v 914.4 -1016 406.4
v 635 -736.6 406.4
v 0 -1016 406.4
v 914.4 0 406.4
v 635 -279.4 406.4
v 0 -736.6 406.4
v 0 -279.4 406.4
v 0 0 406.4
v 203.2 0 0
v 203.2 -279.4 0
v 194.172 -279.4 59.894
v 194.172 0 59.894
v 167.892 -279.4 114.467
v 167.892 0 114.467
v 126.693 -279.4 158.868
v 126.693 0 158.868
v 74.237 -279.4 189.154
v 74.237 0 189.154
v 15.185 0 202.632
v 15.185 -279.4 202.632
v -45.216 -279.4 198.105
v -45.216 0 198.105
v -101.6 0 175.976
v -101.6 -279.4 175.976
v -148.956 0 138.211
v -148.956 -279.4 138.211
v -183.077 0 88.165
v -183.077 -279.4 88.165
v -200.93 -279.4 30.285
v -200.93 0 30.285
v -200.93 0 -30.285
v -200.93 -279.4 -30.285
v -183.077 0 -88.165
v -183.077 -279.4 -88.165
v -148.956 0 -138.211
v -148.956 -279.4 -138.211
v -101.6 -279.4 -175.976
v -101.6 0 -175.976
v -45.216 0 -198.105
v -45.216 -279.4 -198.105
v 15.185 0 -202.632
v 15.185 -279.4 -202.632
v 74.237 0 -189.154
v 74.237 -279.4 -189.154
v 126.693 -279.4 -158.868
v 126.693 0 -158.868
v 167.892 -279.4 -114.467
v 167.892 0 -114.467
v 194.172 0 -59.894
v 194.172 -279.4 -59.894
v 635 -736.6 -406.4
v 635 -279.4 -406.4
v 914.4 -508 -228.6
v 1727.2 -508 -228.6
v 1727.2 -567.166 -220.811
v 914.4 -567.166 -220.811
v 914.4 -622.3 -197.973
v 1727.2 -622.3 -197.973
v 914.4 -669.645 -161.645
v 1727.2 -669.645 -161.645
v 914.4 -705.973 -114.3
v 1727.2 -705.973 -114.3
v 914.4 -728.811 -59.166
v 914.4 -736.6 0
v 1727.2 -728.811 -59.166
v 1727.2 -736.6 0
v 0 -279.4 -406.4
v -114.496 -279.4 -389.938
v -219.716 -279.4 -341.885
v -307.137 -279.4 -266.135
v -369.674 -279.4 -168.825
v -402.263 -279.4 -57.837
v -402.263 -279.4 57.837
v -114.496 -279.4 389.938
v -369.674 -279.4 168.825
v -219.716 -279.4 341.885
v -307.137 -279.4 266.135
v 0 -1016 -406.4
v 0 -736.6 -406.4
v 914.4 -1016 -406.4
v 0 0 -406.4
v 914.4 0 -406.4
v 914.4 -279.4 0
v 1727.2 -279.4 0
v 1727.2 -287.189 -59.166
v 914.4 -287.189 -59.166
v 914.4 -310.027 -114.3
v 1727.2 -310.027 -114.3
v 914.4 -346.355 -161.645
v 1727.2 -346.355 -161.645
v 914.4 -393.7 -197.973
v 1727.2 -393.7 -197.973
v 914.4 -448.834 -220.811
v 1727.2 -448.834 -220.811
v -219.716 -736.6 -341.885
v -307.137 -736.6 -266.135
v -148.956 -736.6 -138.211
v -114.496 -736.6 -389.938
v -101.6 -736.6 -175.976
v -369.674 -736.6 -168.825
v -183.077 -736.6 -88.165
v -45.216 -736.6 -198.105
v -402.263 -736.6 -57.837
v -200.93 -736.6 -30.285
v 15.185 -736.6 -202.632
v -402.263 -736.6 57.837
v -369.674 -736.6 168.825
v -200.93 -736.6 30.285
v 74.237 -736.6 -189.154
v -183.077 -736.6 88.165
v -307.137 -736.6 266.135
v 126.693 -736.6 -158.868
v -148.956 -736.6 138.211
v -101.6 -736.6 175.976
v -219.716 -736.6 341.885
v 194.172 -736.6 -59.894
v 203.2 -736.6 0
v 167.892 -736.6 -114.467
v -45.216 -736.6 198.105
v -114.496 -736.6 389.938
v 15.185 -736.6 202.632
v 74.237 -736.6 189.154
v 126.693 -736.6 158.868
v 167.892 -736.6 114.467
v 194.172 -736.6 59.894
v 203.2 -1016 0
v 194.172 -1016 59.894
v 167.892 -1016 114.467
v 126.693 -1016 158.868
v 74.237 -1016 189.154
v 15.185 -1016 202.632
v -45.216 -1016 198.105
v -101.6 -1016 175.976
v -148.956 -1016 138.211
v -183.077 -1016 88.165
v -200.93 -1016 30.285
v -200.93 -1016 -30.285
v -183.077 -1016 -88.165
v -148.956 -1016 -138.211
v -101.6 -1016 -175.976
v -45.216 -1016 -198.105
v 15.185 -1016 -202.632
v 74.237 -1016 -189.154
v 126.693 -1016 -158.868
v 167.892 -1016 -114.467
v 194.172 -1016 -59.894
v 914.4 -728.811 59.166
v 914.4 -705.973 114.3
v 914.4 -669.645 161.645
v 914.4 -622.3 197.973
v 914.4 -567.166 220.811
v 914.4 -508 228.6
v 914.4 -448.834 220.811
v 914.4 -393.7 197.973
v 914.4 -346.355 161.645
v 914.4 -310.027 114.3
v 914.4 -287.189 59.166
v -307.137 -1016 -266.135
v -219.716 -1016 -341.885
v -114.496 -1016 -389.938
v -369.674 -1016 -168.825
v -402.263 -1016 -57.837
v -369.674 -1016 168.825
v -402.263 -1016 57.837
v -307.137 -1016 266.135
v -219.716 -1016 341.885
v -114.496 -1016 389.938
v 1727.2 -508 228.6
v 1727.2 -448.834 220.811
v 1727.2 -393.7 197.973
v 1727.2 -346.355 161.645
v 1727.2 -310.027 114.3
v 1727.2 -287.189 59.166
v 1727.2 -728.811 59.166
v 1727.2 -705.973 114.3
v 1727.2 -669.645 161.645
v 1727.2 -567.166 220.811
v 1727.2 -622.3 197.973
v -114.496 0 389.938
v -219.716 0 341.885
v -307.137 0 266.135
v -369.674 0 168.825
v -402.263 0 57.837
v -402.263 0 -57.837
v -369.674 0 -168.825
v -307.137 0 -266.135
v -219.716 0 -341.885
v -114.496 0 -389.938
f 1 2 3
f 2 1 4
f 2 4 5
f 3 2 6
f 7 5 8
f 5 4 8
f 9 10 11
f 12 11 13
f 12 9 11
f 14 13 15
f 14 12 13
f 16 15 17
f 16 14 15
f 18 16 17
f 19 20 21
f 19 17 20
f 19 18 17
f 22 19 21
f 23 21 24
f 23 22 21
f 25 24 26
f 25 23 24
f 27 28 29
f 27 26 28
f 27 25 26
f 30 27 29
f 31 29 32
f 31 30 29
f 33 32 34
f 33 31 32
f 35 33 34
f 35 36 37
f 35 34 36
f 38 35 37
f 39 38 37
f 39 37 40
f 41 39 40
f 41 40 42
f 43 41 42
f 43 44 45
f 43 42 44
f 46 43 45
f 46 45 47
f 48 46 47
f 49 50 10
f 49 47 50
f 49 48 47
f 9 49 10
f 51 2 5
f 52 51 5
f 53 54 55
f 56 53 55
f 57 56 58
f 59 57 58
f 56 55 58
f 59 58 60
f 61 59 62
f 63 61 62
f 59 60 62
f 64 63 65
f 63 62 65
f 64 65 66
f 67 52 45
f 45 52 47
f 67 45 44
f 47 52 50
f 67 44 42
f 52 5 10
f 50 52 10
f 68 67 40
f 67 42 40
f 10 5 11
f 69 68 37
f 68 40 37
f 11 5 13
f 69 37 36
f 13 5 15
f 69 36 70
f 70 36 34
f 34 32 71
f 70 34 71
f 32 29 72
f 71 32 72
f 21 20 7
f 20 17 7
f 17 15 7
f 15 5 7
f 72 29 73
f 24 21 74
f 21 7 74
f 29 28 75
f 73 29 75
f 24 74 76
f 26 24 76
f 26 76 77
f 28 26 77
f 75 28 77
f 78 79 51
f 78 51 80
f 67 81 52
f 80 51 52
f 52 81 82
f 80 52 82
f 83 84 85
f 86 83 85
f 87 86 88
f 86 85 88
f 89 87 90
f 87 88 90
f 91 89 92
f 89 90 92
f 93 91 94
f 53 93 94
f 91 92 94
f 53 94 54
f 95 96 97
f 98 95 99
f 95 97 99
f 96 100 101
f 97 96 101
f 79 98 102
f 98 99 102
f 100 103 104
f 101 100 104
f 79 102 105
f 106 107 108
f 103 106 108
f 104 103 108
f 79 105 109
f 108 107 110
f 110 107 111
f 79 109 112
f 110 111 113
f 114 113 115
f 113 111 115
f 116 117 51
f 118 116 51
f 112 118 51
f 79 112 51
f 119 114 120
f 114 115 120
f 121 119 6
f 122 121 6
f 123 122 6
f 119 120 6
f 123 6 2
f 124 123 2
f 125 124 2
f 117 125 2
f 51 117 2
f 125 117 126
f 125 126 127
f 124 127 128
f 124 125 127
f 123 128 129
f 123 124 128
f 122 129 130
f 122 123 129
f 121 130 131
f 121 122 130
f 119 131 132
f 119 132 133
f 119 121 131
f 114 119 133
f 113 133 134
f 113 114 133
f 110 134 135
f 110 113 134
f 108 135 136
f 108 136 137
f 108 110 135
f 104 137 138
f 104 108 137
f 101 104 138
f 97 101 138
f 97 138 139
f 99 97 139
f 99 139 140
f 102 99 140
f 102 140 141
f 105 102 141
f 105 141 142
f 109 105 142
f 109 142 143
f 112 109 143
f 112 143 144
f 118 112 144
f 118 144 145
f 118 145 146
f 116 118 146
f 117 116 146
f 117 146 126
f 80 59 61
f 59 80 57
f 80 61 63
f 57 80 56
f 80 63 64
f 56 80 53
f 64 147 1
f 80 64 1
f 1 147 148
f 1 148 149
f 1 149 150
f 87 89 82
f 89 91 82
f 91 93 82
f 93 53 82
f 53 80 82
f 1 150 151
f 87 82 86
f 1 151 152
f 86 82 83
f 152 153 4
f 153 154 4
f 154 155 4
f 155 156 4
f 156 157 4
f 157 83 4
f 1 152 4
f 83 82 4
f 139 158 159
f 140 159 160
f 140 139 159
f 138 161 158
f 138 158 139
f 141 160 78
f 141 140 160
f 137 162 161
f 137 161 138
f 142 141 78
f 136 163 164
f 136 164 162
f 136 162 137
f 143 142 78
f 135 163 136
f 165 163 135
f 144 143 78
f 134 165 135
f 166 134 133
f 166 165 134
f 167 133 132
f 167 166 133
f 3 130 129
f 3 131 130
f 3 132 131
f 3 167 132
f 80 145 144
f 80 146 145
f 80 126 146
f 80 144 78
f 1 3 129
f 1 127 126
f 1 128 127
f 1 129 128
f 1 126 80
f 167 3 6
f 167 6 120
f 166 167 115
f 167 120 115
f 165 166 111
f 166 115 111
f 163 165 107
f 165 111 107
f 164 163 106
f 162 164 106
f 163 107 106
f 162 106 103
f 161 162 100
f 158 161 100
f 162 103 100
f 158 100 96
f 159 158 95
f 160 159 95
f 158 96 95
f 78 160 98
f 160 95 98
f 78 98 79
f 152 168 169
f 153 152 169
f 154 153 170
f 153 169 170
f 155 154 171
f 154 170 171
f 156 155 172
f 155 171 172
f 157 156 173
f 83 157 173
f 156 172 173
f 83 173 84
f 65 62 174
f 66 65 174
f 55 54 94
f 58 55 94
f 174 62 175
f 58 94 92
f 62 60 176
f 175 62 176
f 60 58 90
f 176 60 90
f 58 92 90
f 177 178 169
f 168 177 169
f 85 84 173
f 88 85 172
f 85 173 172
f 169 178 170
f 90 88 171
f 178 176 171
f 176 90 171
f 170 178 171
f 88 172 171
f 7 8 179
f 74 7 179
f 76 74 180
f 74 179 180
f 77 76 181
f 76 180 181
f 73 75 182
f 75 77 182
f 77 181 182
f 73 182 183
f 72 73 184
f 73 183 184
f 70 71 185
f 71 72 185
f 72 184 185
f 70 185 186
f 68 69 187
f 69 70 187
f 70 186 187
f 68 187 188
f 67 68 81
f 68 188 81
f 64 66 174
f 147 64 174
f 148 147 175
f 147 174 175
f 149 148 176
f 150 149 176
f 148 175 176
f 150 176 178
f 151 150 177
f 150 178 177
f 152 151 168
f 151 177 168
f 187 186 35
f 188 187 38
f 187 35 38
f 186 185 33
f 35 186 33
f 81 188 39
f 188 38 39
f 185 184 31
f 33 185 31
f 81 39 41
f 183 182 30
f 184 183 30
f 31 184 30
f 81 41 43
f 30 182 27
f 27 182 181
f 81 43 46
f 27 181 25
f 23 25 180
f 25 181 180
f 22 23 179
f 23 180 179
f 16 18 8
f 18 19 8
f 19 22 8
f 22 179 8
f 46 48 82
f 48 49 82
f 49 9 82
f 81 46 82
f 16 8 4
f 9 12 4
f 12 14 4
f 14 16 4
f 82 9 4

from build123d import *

# Parameters (mm, degrees)
F0_R     = 203.2
F1_DEPTH = 1016
F2_W     = 127
F2_H     = 457.2
F3_DEPTH = 812.801
F2_W_2   = 635
F2_W_3   = 279.4
F4_DEPTH = 812.801
F5_W     = 812.8
F5_H     = 279.4
F6_DEPTH = 635.001
F8_DEPTH = 812.8


with BuildPart() as f1:
    # F0 (on Front) → F1 (new body)
    with BuildSketch(Plane.XZ):
        with BuildLine():
            ThreePointArc((0, -406.4), (287.368196, -287.368196), (406.4, 0))
            ThreePointArc((406.4, 0), (287.368196, 287.368196), (0, 406.4))
            ThreePointArc((0, 406.4), (-406.4, 0), (0, -406.4))
        make_face()
        Circle(F0_R, mode=Mode.SUBTRACT)
        with BuildLine():
            ThreePointArc((0, 406.4), (287.368196, 287.368196), (406.4, 0))
            ThreePointArc((406.4, 0), (287.368196, -287.368196), (0, -406.4))
            Line((0, -406.4), (914.4, -406.4))
            Line((914.4, -406.4), (914.4, -228.6))
            Line((914.4, -228.6), (1727.2, -228.6))
            Line((1727.2, -228.6), (1727.2, 228.6))
            Line((1727.2, 228.6), (914.4, 228.6))
            Line((914.4, 228.6), (914.4, 406.4))
            Line((914.4, 406.4), (0, 406.4))
        make_face()
    extrude(amount=F1_DEPTH)

    # F2 (on face) → F3 (cut, through all)
    with BuildSketch(Plane.XY.offset(406.4)):
        with Locations((-342.9, -508)):
            Rectangle(F2_W, F2_H)
    extrude(amount=-F3_DEPTH, mode=Mode.SUBTRACT)

    # F2 (on face) → F4 (cut, through all)
    with BuildSketch(Plane.XY.offset(406.4)):
        with Locations((317.5, -508)):
            Rectangle(F2_W_2, F2_H)
        with Locations((-139.7, -508)):
            Rectangle(F2_W_3, F2_H)
        with Locations((-342.9, -508)):
            Rectangle(F2_W, F2_H)
    extrude(amount=-F4_DEPTH, mode=Mode.SUBTRACT)

    # F5 (on face) → F6 (cut, through all)
    with BuildSketch(Plane.XY.offset(228.6)):
        with Locations((1320.8, -139.7)):
            Rectangle(F5_W, F5_H)
        with Locations((1320.8, -876.3)):
            Rectangle(F5_W, F5_H)
    extrude(amount=-F6_DEPTH, mode=Mode.SUBTRACT)

    # F7 (on face) → F8 (cut)
    with BuildSketch(Plane.YZ.offset(1727.2)):
        with BuildLine():
            ThreePointArc((-508, 228.6), (-346.35539, 161.64461), (-279.4, 0))
            Line((-279.4, 0), (-279.4, 228.6))
            Line((-279.4, 228.6), (-508, 228.6))
        make_face()
        with BuildLine():
            Line((-279.4, -228.6), (-279.4, 0))
            ThreePointArc((-279.4, 0), (-346.35539, -161.64461), (-508, -228.6))
            Line((-508, -228.6), (-279.4, -228.6))
        make_face()
        with BuildLine():
            Line((-736.6, -228.6), (-508, -228.6))
            ThreePointArc((-508, -228.6), (-669.64461, -161.64461), (-736.6, -1e-06))
            Line((-736.6, -1e-06), (-736.6, -228.6))
        make_face()
        with BuildLine():
            ThreePointArc((-736.6, -1e-06), (-669.64461, 161.64461), (-508, 228.6))
            Line((-508, 228.6), (-736.6, 228.6))
            Line((-736.6, 228.6), (-736.6, -1e-06))
        make_face()
    extrude(amount=-F8_DEPTH, mode=Mode.SUBTRACT)


solid = f1.part
